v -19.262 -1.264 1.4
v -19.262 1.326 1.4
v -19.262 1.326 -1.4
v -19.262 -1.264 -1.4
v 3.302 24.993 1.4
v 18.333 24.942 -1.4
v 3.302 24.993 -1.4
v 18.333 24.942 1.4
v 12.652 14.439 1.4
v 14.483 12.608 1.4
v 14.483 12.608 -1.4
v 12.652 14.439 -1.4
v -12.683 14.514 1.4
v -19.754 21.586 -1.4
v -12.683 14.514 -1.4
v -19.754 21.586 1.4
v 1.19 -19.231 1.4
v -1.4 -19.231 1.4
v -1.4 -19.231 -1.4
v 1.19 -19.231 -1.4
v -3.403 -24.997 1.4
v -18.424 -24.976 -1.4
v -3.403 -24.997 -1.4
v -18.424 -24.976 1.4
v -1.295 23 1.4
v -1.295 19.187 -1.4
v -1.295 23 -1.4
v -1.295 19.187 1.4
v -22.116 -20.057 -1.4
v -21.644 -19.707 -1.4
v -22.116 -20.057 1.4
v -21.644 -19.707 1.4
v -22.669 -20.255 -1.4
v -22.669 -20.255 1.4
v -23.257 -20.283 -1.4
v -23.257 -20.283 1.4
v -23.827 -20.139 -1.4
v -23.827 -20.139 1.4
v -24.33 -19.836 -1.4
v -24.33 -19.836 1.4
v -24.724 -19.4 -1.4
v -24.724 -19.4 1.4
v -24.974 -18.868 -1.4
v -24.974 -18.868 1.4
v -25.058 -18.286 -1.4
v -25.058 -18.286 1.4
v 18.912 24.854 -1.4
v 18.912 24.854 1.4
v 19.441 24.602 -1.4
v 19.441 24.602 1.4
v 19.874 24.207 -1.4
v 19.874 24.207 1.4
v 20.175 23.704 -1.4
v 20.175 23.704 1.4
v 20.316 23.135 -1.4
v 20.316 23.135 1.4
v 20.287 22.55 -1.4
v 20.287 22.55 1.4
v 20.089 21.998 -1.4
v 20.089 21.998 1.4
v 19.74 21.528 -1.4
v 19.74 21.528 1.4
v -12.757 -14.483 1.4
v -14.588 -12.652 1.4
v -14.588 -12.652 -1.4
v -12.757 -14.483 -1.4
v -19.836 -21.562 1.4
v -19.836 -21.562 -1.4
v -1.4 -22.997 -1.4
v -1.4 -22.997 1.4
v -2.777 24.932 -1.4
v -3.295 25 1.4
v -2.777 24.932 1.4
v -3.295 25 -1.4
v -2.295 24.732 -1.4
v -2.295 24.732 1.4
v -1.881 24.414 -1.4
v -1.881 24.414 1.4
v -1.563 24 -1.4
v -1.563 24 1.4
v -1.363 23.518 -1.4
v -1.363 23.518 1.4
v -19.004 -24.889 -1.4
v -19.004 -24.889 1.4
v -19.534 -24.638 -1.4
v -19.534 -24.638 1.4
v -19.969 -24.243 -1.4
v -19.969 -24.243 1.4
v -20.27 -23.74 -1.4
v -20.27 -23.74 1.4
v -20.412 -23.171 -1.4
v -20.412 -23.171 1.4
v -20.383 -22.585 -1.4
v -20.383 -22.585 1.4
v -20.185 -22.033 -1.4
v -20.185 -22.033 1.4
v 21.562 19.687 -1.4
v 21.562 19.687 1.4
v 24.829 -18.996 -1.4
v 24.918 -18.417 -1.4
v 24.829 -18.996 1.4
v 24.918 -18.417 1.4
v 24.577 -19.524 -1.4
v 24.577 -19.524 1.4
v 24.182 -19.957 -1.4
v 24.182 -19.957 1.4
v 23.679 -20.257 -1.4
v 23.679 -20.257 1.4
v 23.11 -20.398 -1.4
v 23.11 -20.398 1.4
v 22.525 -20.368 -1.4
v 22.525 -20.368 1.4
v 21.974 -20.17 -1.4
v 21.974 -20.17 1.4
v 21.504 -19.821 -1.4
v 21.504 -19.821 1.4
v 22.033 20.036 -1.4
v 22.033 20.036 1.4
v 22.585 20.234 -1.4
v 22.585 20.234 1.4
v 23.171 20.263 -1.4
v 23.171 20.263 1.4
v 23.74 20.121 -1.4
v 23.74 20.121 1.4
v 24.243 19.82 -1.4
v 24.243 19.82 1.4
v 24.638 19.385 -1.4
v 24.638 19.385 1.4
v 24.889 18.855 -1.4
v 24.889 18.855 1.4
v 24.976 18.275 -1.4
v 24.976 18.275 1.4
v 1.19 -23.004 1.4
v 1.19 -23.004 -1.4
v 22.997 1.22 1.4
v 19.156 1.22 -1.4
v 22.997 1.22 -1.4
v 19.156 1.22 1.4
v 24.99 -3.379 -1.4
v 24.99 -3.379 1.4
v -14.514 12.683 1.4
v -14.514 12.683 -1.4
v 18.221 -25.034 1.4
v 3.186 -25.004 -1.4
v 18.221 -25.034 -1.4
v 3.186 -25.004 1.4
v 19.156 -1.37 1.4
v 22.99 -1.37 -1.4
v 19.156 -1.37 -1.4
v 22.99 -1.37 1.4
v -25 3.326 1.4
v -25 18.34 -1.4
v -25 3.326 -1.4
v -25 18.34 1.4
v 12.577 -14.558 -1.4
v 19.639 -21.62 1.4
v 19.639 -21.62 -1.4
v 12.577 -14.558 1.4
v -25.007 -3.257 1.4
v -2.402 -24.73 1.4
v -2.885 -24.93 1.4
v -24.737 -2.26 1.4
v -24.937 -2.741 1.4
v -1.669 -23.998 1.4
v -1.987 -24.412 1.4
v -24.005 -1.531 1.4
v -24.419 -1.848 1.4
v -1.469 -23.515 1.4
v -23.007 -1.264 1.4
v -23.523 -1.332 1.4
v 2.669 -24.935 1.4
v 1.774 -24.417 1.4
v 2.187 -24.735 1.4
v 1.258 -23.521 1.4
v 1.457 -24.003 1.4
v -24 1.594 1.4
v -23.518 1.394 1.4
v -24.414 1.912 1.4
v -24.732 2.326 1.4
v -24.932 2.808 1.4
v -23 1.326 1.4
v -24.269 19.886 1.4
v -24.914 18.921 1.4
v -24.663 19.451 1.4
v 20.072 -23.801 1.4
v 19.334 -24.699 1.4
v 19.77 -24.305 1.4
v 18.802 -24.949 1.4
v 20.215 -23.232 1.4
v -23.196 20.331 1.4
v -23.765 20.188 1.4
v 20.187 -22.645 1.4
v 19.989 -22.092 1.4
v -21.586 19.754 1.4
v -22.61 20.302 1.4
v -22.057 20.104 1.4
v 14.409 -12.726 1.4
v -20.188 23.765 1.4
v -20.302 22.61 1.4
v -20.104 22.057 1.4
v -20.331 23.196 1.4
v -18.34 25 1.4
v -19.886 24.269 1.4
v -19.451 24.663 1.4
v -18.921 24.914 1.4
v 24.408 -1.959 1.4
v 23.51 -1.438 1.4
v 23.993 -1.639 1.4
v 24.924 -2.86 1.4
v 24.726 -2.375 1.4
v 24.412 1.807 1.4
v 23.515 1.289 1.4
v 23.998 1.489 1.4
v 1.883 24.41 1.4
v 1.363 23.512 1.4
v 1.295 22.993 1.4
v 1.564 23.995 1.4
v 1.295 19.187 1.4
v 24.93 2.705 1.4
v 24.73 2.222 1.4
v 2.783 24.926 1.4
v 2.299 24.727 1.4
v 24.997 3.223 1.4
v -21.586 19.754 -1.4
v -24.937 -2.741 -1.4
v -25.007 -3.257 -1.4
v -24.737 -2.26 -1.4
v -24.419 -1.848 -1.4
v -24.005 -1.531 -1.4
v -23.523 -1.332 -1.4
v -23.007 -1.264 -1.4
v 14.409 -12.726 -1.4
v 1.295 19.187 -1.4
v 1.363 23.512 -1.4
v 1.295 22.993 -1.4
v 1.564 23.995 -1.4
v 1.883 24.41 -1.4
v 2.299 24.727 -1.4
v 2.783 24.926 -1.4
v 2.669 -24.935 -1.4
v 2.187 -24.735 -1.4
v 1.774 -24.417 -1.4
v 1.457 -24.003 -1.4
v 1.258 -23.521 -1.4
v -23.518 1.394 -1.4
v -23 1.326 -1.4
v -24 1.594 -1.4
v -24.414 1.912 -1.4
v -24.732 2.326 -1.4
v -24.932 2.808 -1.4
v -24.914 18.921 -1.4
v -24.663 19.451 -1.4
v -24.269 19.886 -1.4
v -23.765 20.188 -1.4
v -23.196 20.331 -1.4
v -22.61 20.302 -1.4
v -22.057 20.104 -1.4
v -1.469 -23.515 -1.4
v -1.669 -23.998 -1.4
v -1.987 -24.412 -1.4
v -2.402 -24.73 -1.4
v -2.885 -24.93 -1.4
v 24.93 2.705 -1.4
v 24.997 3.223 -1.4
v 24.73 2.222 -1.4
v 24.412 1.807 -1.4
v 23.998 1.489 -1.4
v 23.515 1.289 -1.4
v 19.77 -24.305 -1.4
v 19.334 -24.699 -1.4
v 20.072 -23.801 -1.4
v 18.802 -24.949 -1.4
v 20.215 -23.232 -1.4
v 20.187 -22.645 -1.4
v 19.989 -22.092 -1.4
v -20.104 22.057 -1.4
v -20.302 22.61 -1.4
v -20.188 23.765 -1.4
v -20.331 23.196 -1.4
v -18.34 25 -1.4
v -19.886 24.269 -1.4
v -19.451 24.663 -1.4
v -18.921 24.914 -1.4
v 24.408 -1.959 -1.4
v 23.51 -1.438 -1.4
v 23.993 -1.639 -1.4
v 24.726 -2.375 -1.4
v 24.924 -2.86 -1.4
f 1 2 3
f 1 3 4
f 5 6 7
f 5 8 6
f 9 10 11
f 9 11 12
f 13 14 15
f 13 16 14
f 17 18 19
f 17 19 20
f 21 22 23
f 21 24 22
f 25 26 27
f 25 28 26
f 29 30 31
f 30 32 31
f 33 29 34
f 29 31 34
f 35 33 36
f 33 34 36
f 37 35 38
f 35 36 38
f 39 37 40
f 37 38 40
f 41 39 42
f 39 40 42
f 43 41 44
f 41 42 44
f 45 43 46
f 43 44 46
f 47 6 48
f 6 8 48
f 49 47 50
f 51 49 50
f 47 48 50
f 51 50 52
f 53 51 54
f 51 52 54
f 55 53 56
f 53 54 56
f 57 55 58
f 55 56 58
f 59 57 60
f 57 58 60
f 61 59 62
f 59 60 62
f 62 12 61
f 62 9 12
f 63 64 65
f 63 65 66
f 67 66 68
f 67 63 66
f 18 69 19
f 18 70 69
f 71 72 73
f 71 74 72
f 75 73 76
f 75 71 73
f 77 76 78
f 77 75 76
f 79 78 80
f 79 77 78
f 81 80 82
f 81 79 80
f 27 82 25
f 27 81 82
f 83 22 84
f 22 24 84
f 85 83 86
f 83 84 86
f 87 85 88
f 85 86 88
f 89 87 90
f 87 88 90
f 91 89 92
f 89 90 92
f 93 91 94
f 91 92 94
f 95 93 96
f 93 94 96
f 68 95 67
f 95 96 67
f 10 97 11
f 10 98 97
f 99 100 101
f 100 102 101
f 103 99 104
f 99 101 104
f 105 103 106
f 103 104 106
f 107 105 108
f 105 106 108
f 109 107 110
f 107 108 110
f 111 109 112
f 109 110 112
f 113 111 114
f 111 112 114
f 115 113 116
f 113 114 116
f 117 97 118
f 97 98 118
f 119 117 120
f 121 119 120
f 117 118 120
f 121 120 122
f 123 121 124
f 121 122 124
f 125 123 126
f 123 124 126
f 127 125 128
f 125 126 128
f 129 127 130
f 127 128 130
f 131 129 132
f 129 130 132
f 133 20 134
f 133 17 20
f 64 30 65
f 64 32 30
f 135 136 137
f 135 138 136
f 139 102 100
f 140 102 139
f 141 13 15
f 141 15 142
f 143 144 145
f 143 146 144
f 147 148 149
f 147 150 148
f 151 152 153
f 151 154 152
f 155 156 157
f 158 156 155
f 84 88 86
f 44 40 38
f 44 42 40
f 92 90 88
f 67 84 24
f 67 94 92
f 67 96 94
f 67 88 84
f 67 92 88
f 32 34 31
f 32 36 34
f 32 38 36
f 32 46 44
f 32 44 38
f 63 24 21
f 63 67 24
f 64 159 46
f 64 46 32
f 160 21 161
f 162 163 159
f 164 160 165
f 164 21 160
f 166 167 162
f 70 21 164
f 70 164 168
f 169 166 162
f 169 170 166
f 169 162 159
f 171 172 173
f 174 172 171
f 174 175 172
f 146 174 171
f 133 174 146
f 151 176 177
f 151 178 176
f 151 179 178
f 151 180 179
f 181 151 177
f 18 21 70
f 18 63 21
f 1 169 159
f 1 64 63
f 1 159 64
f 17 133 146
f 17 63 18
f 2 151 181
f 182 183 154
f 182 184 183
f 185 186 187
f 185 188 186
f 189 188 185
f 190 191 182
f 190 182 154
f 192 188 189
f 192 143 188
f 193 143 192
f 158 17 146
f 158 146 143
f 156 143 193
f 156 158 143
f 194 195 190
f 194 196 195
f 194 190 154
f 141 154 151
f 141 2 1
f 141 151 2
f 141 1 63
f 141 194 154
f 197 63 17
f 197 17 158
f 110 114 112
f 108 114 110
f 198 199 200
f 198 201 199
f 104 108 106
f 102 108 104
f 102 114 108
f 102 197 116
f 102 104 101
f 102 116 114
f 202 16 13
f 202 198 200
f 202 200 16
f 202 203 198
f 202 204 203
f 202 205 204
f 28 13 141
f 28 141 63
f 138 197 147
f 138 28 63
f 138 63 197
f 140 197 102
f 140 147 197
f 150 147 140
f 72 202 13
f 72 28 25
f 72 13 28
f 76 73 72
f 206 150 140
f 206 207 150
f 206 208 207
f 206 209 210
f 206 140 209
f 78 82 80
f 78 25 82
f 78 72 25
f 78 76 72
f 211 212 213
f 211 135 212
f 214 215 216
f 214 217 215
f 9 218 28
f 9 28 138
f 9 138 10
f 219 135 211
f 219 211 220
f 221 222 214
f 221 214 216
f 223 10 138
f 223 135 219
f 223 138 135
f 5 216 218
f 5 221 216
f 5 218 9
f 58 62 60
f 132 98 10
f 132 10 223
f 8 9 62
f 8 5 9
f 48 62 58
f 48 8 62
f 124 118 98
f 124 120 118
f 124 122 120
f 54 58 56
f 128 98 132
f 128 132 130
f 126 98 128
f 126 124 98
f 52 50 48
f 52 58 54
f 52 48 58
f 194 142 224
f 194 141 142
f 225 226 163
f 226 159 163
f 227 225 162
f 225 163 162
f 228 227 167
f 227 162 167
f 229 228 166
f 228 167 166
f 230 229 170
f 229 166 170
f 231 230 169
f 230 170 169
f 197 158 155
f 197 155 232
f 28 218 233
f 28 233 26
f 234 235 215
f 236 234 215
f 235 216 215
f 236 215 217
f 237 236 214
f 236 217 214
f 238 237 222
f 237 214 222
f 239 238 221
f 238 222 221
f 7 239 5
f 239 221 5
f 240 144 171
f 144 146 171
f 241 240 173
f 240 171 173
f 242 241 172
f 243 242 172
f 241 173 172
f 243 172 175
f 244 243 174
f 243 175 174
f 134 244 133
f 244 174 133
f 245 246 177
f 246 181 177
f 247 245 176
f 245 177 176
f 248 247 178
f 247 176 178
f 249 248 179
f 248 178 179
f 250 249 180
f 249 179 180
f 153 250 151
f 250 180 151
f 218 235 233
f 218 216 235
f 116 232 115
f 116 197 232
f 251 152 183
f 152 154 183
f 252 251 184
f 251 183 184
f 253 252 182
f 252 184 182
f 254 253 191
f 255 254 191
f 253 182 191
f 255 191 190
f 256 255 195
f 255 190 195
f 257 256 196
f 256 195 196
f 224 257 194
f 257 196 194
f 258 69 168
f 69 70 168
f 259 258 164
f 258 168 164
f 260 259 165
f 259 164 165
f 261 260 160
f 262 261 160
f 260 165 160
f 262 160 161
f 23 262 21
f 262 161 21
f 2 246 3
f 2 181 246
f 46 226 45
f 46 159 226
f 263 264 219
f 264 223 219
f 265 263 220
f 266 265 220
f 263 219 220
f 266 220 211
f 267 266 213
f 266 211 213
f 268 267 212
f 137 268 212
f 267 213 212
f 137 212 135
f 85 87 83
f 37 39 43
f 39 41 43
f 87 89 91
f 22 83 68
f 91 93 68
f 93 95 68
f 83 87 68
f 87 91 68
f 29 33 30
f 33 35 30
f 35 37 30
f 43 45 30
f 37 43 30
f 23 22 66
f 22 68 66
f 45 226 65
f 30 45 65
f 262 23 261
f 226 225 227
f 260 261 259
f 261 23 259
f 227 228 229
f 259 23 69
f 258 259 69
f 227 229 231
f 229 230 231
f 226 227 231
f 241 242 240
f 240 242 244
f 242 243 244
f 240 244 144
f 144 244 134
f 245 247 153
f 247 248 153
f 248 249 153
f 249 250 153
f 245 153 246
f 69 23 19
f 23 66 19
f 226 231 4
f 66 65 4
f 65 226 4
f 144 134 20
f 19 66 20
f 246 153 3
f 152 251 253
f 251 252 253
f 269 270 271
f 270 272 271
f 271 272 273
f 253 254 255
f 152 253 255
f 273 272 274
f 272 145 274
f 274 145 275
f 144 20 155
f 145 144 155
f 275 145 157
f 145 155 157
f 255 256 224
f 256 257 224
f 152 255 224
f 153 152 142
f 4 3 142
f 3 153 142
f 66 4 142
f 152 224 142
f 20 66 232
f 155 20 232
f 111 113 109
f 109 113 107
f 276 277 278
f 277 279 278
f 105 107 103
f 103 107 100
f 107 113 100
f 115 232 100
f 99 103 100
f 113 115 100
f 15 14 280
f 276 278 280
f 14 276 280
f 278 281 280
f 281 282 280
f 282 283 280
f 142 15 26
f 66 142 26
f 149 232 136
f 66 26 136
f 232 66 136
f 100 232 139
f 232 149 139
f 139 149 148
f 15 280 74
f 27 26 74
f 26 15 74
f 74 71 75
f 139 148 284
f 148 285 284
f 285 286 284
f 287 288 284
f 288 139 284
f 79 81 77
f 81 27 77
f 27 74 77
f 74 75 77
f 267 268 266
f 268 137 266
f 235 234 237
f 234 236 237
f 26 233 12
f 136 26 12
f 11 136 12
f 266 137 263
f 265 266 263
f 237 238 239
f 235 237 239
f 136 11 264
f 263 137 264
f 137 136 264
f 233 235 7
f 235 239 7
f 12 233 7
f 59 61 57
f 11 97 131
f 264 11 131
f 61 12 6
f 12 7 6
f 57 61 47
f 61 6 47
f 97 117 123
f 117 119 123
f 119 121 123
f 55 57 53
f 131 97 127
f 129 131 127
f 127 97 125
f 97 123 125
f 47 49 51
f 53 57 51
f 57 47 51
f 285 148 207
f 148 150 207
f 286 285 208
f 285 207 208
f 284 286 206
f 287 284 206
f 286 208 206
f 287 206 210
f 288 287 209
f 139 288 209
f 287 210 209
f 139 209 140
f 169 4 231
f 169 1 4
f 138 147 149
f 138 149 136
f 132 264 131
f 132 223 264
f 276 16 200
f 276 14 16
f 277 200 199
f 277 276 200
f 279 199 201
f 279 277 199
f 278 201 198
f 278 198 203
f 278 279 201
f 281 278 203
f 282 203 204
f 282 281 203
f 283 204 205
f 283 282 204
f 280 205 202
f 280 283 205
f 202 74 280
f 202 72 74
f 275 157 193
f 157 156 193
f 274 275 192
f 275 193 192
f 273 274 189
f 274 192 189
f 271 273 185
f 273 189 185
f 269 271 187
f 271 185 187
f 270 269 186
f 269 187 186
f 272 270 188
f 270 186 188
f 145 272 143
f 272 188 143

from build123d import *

# Parameters (mm, degrees)
BOSS_EXTRUDE1_DEPTH = 1.4
FILLET1_R           = 2


with BuildPart() as part:
    # Sketch2 → Boss-Extrude1 (new body, symmetric)
    with BuildSketch(Plane.XY):
        Polygon((-23.168593437, 25), (-12.682504049, 14.513910612), (-14.513910612, 12.682504049), (-25, 23.168593437), (-25, 1.325866762), (-19.261635993, 1.325866762), (-19.261635993, -1.264133238), (-25, -1.264133238), (-25.074518955, -23.137726675), (-14.588429567, -12.651637287), (-12.757023004, -14.48304385), (-23.243112392, -24.969133238), (-1.400385717, -25), (-1.400385717, -19.230769231), (1.189614283, -19.230769231), (1.189614283, -25), (23.063207719, -25.043652193), (12.577118332, -14.557562806), (14.408524895, -12.726156242), (24.894614283, -23.21224563), (25, -1.369518955), (19.156250275, -1.369518955), (19.156250275, 1.220481045), (25, 1.220481045), (24.969133238, 23.094074481), (14.48304385, 12.607985094), (12.651637287, 14.439391657), (23.137726675, 24.925481045), (1.295, 25), (1.295, 19.187117037), (-1.295, 19.187117037), (-1.295, 25), align=None)
    extrude(amount=BOSS_EXTRUDE1_DEPTH, both=True)

    # Fillet1
    fillet1_edges = [part.edges().sort_by_distance(p)[0] for p in [
        (-1.295, 25, 0),
        (1.295, 25, 0),
        (23.137726675, 24.925481045, 0),
        (24.969133238, 23.094074481, 0),
        (25, 1.220481045, 0),
        (25, -1.369518955, 0),
        (24.894614283, -23.21224563, 0),
        (23.063207719, -25.043652193, 0),
        (1.189614283, -25, 0),
        (-1.400385717, -25, 0),
        (-23.243112392, -24.969133238, 0),
        (-25.074518955, -23.137726675, 0),
        (-25, -1.264133238, 0),
        (-25, 1.325866762, 0),
        (-25, 23.168593437, 0),
        (-23.168593437, 25, 0),
    ]]
    fillet(fillet1_edges, radius=FILLET1_R)


solid = part.part
